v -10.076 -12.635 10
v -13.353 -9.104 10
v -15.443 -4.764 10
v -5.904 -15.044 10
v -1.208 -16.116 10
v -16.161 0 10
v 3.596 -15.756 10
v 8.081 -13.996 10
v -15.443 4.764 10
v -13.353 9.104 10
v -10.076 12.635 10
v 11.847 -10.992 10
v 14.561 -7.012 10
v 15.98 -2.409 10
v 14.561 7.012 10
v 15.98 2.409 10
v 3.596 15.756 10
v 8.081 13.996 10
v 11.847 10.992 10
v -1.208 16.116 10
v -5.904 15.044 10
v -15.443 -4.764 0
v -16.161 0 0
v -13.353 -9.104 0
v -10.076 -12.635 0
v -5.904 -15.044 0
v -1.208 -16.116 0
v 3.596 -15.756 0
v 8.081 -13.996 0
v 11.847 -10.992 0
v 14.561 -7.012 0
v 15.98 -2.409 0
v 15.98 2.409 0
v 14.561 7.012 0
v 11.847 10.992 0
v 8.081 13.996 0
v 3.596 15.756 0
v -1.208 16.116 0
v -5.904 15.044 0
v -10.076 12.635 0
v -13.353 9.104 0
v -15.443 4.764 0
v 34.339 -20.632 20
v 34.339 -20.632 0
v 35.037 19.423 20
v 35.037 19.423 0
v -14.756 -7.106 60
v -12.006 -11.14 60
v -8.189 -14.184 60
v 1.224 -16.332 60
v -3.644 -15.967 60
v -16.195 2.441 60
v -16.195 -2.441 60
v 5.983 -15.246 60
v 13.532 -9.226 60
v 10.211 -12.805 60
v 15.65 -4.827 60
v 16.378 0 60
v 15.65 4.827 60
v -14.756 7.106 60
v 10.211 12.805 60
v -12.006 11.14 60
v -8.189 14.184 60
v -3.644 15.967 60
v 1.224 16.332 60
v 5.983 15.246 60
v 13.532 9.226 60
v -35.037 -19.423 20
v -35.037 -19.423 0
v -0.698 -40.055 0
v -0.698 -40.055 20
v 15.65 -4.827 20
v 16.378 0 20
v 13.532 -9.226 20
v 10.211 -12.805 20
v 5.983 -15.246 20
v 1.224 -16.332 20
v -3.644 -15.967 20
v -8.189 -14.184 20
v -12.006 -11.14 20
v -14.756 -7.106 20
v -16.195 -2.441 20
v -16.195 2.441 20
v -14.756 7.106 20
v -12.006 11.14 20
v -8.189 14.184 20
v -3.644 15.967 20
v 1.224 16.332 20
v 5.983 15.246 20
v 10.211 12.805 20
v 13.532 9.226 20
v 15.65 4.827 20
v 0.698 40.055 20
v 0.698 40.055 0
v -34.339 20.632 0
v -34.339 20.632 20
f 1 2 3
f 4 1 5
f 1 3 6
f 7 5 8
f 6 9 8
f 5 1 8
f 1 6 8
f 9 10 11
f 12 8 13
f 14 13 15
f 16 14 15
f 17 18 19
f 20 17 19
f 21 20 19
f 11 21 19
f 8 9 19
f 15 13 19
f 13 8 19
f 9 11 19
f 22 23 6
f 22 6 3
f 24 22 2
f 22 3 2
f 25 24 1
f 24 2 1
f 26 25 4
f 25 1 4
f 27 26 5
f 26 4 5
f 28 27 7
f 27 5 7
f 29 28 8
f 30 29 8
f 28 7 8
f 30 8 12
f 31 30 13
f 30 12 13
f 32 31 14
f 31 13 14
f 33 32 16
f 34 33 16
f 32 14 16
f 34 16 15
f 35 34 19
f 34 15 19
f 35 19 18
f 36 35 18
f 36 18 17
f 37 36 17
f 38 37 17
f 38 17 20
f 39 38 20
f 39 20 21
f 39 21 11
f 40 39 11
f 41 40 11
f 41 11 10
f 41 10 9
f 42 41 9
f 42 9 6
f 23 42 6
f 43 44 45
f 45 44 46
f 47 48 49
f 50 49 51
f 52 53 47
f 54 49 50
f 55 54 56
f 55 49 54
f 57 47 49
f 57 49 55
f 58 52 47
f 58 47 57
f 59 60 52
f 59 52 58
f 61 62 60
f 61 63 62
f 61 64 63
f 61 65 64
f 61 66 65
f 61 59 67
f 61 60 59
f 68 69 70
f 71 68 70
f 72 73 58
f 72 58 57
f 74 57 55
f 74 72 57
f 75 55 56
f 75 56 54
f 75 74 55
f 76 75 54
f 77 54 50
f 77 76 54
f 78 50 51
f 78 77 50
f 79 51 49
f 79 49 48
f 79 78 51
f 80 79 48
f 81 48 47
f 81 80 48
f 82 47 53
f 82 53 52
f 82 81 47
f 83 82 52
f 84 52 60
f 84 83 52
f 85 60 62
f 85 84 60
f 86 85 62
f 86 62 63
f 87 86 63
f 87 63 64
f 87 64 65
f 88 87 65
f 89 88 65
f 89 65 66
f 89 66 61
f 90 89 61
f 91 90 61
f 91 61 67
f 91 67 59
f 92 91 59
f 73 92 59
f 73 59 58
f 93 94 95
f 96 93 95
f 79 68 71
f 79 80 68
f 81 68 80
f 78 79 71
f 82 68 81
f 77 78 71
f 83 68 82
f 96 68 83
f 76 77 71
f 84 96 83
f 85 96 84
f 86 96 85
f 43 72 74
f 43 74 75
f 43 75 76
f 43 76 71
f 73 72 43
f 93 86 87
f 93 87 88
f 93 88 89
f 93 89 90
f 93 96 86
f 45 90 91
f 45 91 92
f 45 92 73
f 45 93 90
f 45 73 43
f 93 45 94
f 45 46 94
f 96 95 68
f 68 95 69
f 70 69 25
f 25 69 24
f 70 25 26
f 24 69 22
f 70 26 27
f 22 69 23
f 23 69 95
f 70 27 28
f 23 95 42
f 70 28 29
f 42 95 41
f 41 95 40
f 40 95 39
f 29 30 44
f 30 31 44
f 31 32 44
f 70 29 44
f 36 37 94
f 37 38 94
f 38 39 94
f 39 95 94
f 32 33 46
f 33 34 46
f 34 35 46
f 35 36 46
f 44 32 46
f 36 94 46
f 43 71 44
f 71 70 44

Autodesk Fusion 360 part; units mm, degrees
sketch "Sketch1" plane through (0, 0, 0) normal (0, 0, 1) x (1, 0, 0)
  line L0 (-34.3393, 20.6317) -> (-35.0372, -19.4228)
  line L1 (-35.0372, -19.4228) -> (-0.698, -40.0546)
  line L2 (-0.698, -40.0546) -> (34.3393, -20.6317)
  line L3 (34.3393, -20.6317) -> (35.0372, 19.4228)
  line L4 (35.0372, 19.4228) -> (0.698, 40.0546)
  line L5 (0.698, 40.0546) -> (-34.3393, 20.6317)
extrude "Extrude1" add sketch "Sketch1" along normal blind 20 makes body 1
sketch "Sketch2" plane through (0, 0, 20) normal (0, 0, 1) x (-1, 0, 0)
  line L0 (-0.698, -40.0546) -> (34.3393, -20.6317)
  line L1 (34.3393, -20.6317) -> (35.0372, 19.4228)
  line L2 (35.0372, 19.4228) -> (0.698, 40.0546)
  line L3 (0.698, 40.0546) -> (-34.3393, 20.6317)
  line L4 (-34.3393, 20.6317) -> (-35.0372, -19.4228)
  line L5 (-35.0372, -19.4228) -> (-0.698, -40.0546)
  circle A0 centre (0, 0) radius 16.161
extrude "Extrude2" cut sketch "Sketch2" against normal blind 60 contours A0 bodies 1
sketch "Sketch3" plane through (0, 0, 0) normal (0, 0, 1) x (1, 0, 0)
  circle A0 centre (-100, 0) radius 16.6427
extrude "Extrude3" add sketch "Sketch3" along normal blind 50 separate body makes body 2
thread "Thread1" "ISO Metric profile 33.0 M33x3.5 6g" major diameter 32.7555 minor diameter 28.7529 pitch 3.5 angle 60 resizes the face on face at (-83.44, -1.6571, 16.6667) on bodies 2
move_body "Move1" bodies 2 to x (1, 0, 0) y (0, 1, 0) z (0, 0, 1) at (100, 0, 10)
combine "Combine1" operation add target body 1 tool bodies 2
thread "Thread2" "ISO Metric profile 33.0 M33x3.5 6g" major diameter 32.7555 minor diameter 28.7529 pitch 3.5 angle 60 resizes the face on face at (16.3574, 0.8164, 33.3333) on bodies 1
